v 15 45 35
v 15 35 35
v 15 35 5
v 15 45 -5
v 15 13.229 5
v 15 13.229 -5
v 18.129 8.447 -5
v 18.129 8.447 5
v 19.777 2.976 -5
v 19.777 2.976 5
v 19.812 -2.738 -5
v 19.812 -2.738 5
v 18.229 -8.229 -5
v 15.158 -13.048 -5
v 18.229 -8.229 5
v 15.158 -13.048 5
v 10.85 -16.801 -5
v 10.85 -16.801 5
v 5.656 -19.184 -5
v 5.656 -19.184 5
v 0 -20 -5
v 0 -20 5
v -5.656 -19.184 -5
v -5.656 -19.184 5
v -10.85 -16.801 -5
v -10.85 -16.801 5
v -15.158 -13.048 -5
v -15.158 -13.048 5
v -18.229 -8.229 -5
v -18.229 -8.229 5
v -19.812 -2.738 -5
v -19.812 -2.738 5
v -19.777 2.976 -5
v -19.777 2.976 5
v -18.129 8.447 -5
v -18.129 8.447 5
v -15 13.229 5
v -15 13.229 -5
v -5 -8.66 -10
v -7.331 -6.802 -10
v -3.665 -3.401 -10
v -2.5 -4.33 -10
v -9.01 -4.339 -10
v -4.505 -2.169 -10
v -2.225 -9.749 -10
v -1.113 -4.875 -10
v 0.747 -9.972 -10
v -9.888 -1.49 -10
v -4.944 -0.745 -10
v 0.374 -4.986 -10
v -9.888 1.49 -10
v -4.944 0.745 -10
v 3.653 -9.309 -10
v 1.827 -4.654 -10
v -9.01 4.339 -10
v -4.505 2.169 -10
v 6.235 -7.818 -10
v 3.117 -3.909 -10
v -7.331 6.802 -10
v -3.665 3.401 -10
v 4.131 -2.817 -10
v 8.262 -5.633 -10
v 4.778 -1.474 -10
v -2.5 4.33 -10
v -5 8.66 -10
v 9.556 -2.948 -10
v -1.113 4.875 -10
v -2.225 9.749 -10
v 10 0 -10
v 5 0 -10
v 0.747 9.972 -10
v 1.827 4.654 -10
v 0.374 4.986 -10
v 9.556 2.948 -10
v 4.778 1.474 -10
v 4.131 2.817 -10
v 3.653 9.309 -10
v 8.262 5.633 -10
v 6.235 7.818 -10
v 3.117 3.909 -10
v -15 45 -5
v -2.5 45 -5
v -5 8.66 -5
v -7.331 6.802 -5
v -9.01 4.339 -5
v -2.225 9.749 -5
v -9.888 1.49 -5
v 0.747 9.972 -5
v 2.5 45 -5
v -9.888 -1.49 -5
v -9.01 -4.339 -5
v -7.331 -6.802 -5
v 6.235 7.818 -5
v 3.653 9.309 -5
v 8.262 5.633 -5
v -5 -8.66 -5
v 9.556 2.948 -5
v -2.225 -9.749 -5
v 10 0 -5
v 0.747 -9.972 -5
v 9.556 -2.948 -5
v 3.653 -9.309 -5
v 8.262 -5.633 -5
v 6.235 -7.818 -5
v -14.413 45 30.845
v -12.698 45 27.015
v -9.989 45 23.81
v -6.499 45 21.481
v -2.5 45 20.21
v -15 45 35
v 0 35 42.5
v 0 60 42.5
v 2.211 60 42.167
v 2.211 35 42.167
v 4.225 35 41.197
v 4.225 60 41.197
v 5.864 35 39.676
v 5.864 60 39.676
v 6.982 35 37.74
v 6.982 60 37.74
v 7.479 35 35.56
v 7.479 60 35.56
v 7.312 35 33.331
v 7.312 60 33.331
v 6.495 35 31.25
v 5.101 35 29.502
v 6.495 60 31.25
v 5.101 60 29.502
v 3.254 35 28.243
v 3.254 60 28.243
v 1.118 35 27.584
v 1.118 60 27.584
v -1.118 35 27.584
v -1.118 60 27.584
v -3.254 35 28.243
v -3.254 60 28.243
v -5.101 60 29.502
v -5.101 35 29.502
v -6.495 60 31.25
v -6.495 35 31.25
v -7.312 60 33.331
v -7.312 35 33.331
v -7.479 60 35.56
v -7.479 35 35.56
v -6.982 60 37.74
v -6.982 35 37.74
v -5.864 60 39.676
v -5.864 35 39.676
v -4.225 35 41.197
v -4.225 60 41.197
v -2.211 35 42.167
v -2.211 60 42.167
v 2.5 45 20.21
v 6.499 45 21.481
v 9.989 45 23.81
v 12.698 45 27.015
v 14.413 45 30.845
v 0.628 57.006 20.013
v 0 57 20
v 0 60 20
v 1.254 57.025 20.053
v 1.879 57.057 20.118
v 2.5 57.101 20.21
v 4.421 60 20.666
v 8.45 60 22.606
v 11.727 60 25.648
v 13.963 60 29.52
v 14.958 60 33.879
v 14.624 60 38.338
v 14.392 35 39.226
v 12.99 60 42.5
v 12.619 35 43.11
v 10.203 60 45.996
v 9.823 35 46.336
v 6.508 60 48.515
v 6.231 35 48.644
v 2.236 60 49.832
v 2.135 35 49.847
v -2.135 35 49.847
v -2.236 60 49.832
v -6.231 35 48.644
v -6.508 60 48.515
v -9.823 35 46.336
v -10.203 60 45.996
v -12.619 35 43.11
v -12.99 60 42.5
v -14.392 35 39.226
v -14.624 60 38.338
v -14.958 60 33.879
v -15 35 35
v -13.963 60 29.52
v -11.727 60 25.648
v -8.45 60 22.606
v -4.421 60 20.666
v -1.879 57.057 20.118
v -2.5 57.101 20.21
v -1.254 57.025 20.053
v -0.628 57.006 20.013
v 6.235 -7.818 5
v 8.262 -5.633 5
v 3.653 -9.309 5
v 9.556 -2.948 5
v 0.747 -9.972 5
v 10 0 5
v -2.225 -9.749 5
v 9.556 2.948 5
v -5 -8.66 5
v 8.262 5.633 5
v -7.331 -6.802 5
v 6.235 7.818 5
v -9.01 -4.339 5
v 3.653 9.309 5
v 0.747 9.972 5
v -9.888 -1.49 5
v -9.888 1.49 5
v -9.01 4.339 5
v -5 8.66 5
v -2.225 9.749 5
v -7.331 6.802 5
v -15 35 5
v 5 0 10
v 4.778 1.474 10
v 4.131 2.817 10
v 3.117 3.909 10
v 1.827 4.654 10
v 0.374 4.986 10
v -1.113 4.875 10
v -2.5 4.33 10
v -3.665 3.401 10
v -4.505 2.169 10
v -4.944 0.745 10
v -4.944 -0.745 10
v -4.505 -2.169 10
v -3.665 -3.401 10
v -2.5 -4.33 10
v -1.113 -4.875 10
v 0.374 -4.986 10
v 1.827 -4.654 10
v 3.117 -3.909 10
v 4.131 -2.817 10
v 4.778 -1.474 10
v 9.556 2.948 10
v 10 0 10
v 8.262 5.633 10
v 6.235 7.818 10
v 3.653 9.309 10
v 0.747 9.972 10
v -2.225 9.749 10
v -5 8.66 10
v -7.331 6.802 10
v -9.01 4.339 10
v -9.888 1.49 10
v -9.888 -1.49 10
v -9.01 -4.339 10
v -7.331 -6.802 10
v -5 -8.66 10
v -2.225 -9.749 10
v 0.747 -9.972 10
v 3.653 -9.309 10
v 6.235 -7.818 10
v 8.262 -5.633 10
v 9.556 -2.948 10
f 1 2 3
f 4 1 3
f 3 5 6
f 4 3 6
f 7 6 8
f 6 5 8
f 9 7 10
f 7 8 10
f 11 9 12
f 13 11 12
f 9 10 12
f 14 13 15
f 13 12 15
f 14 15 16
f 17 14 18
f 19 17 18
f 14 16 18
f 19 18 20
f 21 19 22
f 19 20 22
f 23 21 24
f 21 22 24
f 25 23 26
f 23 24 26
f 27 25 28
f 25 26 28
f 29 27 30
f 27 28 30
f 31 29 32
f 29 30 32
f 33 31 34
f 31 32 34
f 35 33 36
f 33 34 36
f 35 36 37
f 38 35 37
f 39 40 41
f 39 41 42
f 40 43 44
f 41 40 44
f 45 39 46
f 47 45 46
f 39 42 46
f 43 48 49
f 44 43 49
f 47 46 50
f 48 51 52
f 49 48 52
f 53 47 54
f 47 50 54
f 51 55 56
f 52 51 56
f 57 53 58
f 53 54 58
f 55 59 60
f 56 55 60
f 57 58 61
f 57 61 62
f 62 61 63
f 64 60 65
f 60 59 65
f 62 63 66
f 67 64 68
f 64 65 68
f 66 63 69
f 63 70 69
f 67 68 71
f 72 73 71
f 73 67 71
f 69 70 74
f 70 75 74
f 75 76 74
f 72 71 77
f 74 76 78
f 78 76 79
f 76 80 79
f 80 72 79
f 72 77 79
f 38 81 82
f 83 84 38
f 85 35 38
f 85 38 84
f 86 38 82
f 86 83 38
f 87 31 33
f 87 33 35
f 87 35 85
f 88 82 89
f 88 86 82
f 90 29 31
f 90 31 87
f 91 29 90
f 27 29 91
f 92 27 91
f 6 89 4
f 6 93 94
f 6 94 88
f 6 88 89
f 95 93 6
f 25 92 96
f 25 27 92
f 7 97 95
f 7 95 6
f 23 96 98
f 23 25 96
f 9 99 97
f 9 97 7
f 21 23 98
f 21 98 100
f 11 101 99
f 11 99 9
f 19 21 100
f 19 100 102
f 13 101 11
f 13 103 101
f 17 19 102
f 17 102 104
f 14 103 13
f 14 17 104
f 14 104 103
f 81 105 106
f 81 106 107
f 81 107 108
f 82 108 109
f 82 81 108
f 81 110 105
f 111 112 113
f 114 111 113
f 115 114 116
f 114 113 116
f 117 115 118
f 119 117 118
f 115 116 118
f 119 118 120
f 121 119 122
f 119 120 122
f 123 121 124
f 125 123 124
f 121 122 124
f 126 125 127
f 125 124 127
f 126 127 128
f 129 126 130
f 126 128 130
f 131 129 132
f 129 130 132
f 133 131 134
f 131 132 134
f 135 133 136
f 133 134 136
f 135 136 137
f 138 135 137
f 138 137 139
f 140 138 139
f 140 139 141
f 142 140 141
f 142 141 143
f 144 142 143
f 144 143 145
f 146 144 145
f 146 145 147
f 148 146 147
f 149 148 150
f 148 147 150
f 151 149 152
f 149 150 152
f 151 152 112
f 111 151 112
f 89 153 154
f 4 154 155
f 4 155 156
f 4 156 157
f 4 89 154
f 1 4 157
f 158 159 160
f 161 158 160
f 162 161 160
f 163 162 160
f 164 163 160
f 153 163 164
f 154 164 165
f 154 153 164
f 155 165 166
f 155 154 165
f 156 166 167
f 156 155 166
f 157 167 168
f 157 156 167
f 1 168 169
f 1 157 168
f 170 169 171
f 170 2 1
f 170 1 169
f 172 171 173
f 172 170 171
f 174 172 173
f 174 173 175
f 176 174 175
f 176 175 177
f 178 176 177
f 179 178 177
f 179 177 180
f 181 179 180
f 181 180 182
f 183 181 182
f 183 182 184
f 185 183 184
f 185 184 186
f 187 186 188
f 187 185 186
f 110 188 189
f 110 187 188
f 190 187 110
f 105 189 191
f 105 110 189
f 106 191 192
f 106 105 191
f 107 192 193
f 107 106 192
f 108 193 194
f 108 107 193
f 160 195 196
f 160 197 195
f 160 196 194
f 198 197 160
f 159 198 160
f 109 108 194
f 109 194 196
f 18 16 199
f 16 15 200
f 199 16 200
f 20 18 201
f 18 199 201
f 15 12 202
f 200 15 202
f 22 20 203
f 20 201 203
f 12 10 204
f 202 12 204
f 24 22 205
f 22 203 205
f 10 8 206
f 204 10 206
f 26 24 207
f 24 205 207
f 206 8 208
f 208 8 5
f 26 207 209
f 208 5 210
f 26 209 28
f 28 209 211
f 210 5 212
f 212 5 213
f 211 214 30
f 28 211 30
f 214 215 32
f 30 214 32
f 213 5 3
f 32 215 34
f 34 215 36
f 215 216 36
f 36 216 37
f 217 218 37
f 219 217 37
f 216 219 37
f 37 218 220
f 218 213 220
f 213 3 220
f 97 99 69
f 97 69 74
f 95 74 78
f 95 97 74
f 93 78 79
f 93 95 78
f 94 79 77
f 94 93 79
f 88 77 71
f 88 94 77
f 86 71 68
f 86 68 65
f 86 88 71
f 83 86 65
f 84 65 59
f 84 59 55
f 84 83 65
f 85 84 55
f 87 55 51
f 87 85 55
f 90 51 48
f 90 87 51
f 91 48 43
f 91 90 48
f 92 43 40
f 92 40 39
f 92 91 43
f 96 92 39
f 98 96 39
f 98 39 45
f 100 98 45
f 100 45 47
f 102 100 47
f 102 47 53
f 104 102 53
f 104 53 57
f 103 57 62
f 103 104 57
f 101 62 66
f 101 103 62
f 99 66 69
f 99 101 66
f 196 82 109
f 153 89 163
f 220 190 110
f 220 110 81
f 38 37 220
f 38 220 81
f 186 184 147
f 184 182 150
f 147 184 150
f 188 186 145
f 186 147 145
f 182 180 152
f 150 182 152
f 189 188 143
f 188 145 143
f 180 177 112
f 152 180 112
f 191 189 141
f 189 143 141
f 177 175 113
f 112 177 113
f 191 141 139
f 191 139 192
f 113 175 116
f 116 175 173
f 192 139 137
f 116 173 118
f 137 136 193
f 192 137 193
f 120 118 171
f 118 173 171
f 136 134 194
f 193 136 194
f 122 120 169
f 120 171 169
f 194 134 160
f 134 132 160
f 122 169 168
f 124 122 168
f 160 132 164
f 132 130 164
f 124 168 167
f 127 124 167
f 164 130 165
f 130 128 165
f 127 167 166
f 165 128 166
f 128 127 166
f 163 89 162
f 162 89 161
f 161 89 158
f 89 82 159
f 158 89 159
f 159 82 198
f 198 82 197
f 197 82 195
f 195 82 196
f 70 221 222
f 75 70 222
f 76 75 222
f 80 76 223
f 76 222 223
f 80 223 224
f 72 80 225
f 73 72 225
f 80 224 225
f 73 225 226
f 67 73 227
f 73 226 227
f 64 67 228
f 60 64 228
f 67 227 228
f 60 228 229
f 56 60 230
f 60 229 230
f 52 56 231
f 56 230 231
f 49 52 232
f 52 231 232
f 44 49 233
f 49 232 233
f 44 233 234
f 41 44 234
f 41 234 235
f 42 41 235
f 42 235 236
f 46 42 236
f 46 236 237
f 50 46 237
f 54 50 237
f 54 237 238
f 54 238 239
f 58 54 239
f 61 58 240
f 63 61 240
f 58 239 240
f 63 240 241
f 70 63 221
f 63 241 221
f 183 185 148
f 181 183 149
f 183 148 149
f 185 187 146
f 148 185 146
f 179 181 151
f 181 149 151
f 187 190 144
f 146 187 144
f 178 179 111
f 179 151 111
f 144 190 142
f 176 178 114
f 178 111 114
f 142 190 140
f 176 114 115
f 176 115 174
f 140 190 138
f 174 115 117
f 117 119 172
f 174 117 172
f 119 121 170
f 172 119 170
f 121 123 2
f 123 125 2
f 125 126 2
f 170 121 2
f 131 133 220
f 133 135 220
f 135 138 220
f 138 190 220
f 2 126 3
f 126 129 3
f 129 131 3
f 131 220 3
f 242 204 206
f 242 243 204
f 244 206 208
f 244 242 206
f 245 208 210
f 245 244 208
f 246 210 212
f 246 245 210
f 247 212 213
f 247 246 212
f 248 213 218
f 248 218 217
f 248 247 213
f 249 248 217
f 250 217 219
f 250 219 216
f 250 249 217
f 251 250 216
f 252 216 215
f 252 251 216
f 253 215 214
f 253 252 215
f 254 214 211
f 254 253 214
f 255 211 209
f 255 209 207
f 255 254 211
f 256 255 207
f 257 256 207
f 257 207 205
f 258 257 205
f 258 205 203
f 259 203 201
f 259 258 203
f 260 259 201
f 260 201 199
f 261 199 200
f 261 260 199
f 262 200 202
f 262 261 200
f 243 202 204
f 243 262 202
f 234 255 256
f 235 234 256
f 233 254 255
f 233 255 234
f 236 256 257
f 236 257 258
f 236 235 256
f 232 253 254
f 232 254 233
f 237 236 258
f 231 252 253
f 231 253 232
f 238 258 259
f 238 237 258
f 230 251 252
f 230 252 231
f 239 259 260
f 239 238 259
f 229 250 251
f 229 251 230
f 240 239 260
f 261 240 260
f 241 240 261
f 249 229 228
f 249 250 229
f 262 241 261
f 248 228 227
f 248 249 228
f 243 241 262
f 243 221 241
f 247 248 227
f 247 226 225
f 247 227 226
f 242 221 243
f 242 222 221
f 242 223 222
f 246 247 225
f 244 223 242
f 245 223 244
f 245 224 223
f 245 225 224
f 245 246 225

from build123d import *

# Parameters (mm, degrees)
EXTRUDE_1_DEPTH     = 5
SKETCH_2_R          = 10
EXTRUDE_2_DEPTH     = 10
SKETCH_3_R          = 5
CUT_EXTRUDE_1_DEPTH = 20
SKETCH_4_W          = 30
SKETCH_4_H          = 40
EXTRUDE_3_DEPTH     = 10
SKETCH_5_R          = 15
EXTRUDE_4_DEPTH     = 25
SKETCH_6_R          = 7.5
CUT_EXTRUDE_2_DEPTH = 25
RIB_3_REACH         = 82.623
SKETCH_7_WALL_W     = 190.976004214
SKETCH_7_WALL_H     = 5


with BuildPart() as part:
    # 草图1 → 凸台-拉伸1 (new, symmetric)
    with BuildSketch(Plane.XY):
        with BuildLine():
            Line((-15, 35), (15, 35))
            Line((15, 35), (15, 13.228756555))
            ThreePointArc((15, 13.228756555), (0, -20), (-15, 13.228756555))
            Line((-15, 13.228756555), (-15, 35))
        make_face()
    extrude(amount=EXTRUDE_1_DEPTH, both=True)

    # 草图2 → 凸台-拉伸2 (add, symmetric)
    with BuildSketch(Plane.XY):
        Circle(SKETCH_2_R)
    extrude(amount=EXTRUDE_2_DEPTH, both=True)

    # 草图3 → 切除-拉伸1 (cut)
    with BuildSketch(Plane.XY.offset(10)):
        Circle(SKETCH_3_R)
    extrude(amount=-CUT_EXTRUDE_1_DEPTH, mode=Mode.SUBTRACT)

    # 草图4 → 凸台-拉伸3 (add)
    with BuildSketch(Plane(origin=(0, 35, 0), x_dir=(1, 0, 0), z_dir=(0, 1, 0))):
        with Locations((0, -15)):
            Rectangle(SKETCH_4_W, SKETCH_4_H)
    extrude(amount=EXTRUDE_3_DEPTH)

    # 草图5 → 凸台-拉伸4 (add)
    with BuildSketch(Plane.XZ.offset(-35)):
        with Locations(Location((0, 35, 0), (0, 0, 270))):
            Circle(SKETCH_5_R)
    extrude(amount=-EXTRUDE_4_DEPTH)

    # 草图6 → 切除-拉伸2 (cut)
    with BuildSketch(Plane(origin=(0, 60, 0), x_dir=(1, 0, 0), z_dir=(0, 1, 0))):
        with Locations(Location((0, -35, 0), (0, 0, 270))):
            Circle(SKETCH_6_R)
    extrude(amount=-CUT_EXTRUDE_2_DEPTH, mode=Mode.SUBTRACT)

    # 草图7 wall → 筋3 (add, up to next)
    with BuildSketch(Plane(origin=(0, 51, 7.5), x_dir=(0, 0.432731067585, 0.901523057468), z_dir=(0, -0.901523057468, 0.432731067585)), mode=Mode.PRIVATE) as rib_3_sk1:
        Rectangle(SKETCH_7_WALL_W, SKETCH_7_WALL_H)
    rib_3_tool1 = extrude(rib_3_sk1.sketch, amount=RIB_3_REACH, mode=Mode.PRIVATE) - part.part
    add(rib_3_tool1.solids().sort_by_distance((0, 51, 7.5))[0])


solid = part.part
